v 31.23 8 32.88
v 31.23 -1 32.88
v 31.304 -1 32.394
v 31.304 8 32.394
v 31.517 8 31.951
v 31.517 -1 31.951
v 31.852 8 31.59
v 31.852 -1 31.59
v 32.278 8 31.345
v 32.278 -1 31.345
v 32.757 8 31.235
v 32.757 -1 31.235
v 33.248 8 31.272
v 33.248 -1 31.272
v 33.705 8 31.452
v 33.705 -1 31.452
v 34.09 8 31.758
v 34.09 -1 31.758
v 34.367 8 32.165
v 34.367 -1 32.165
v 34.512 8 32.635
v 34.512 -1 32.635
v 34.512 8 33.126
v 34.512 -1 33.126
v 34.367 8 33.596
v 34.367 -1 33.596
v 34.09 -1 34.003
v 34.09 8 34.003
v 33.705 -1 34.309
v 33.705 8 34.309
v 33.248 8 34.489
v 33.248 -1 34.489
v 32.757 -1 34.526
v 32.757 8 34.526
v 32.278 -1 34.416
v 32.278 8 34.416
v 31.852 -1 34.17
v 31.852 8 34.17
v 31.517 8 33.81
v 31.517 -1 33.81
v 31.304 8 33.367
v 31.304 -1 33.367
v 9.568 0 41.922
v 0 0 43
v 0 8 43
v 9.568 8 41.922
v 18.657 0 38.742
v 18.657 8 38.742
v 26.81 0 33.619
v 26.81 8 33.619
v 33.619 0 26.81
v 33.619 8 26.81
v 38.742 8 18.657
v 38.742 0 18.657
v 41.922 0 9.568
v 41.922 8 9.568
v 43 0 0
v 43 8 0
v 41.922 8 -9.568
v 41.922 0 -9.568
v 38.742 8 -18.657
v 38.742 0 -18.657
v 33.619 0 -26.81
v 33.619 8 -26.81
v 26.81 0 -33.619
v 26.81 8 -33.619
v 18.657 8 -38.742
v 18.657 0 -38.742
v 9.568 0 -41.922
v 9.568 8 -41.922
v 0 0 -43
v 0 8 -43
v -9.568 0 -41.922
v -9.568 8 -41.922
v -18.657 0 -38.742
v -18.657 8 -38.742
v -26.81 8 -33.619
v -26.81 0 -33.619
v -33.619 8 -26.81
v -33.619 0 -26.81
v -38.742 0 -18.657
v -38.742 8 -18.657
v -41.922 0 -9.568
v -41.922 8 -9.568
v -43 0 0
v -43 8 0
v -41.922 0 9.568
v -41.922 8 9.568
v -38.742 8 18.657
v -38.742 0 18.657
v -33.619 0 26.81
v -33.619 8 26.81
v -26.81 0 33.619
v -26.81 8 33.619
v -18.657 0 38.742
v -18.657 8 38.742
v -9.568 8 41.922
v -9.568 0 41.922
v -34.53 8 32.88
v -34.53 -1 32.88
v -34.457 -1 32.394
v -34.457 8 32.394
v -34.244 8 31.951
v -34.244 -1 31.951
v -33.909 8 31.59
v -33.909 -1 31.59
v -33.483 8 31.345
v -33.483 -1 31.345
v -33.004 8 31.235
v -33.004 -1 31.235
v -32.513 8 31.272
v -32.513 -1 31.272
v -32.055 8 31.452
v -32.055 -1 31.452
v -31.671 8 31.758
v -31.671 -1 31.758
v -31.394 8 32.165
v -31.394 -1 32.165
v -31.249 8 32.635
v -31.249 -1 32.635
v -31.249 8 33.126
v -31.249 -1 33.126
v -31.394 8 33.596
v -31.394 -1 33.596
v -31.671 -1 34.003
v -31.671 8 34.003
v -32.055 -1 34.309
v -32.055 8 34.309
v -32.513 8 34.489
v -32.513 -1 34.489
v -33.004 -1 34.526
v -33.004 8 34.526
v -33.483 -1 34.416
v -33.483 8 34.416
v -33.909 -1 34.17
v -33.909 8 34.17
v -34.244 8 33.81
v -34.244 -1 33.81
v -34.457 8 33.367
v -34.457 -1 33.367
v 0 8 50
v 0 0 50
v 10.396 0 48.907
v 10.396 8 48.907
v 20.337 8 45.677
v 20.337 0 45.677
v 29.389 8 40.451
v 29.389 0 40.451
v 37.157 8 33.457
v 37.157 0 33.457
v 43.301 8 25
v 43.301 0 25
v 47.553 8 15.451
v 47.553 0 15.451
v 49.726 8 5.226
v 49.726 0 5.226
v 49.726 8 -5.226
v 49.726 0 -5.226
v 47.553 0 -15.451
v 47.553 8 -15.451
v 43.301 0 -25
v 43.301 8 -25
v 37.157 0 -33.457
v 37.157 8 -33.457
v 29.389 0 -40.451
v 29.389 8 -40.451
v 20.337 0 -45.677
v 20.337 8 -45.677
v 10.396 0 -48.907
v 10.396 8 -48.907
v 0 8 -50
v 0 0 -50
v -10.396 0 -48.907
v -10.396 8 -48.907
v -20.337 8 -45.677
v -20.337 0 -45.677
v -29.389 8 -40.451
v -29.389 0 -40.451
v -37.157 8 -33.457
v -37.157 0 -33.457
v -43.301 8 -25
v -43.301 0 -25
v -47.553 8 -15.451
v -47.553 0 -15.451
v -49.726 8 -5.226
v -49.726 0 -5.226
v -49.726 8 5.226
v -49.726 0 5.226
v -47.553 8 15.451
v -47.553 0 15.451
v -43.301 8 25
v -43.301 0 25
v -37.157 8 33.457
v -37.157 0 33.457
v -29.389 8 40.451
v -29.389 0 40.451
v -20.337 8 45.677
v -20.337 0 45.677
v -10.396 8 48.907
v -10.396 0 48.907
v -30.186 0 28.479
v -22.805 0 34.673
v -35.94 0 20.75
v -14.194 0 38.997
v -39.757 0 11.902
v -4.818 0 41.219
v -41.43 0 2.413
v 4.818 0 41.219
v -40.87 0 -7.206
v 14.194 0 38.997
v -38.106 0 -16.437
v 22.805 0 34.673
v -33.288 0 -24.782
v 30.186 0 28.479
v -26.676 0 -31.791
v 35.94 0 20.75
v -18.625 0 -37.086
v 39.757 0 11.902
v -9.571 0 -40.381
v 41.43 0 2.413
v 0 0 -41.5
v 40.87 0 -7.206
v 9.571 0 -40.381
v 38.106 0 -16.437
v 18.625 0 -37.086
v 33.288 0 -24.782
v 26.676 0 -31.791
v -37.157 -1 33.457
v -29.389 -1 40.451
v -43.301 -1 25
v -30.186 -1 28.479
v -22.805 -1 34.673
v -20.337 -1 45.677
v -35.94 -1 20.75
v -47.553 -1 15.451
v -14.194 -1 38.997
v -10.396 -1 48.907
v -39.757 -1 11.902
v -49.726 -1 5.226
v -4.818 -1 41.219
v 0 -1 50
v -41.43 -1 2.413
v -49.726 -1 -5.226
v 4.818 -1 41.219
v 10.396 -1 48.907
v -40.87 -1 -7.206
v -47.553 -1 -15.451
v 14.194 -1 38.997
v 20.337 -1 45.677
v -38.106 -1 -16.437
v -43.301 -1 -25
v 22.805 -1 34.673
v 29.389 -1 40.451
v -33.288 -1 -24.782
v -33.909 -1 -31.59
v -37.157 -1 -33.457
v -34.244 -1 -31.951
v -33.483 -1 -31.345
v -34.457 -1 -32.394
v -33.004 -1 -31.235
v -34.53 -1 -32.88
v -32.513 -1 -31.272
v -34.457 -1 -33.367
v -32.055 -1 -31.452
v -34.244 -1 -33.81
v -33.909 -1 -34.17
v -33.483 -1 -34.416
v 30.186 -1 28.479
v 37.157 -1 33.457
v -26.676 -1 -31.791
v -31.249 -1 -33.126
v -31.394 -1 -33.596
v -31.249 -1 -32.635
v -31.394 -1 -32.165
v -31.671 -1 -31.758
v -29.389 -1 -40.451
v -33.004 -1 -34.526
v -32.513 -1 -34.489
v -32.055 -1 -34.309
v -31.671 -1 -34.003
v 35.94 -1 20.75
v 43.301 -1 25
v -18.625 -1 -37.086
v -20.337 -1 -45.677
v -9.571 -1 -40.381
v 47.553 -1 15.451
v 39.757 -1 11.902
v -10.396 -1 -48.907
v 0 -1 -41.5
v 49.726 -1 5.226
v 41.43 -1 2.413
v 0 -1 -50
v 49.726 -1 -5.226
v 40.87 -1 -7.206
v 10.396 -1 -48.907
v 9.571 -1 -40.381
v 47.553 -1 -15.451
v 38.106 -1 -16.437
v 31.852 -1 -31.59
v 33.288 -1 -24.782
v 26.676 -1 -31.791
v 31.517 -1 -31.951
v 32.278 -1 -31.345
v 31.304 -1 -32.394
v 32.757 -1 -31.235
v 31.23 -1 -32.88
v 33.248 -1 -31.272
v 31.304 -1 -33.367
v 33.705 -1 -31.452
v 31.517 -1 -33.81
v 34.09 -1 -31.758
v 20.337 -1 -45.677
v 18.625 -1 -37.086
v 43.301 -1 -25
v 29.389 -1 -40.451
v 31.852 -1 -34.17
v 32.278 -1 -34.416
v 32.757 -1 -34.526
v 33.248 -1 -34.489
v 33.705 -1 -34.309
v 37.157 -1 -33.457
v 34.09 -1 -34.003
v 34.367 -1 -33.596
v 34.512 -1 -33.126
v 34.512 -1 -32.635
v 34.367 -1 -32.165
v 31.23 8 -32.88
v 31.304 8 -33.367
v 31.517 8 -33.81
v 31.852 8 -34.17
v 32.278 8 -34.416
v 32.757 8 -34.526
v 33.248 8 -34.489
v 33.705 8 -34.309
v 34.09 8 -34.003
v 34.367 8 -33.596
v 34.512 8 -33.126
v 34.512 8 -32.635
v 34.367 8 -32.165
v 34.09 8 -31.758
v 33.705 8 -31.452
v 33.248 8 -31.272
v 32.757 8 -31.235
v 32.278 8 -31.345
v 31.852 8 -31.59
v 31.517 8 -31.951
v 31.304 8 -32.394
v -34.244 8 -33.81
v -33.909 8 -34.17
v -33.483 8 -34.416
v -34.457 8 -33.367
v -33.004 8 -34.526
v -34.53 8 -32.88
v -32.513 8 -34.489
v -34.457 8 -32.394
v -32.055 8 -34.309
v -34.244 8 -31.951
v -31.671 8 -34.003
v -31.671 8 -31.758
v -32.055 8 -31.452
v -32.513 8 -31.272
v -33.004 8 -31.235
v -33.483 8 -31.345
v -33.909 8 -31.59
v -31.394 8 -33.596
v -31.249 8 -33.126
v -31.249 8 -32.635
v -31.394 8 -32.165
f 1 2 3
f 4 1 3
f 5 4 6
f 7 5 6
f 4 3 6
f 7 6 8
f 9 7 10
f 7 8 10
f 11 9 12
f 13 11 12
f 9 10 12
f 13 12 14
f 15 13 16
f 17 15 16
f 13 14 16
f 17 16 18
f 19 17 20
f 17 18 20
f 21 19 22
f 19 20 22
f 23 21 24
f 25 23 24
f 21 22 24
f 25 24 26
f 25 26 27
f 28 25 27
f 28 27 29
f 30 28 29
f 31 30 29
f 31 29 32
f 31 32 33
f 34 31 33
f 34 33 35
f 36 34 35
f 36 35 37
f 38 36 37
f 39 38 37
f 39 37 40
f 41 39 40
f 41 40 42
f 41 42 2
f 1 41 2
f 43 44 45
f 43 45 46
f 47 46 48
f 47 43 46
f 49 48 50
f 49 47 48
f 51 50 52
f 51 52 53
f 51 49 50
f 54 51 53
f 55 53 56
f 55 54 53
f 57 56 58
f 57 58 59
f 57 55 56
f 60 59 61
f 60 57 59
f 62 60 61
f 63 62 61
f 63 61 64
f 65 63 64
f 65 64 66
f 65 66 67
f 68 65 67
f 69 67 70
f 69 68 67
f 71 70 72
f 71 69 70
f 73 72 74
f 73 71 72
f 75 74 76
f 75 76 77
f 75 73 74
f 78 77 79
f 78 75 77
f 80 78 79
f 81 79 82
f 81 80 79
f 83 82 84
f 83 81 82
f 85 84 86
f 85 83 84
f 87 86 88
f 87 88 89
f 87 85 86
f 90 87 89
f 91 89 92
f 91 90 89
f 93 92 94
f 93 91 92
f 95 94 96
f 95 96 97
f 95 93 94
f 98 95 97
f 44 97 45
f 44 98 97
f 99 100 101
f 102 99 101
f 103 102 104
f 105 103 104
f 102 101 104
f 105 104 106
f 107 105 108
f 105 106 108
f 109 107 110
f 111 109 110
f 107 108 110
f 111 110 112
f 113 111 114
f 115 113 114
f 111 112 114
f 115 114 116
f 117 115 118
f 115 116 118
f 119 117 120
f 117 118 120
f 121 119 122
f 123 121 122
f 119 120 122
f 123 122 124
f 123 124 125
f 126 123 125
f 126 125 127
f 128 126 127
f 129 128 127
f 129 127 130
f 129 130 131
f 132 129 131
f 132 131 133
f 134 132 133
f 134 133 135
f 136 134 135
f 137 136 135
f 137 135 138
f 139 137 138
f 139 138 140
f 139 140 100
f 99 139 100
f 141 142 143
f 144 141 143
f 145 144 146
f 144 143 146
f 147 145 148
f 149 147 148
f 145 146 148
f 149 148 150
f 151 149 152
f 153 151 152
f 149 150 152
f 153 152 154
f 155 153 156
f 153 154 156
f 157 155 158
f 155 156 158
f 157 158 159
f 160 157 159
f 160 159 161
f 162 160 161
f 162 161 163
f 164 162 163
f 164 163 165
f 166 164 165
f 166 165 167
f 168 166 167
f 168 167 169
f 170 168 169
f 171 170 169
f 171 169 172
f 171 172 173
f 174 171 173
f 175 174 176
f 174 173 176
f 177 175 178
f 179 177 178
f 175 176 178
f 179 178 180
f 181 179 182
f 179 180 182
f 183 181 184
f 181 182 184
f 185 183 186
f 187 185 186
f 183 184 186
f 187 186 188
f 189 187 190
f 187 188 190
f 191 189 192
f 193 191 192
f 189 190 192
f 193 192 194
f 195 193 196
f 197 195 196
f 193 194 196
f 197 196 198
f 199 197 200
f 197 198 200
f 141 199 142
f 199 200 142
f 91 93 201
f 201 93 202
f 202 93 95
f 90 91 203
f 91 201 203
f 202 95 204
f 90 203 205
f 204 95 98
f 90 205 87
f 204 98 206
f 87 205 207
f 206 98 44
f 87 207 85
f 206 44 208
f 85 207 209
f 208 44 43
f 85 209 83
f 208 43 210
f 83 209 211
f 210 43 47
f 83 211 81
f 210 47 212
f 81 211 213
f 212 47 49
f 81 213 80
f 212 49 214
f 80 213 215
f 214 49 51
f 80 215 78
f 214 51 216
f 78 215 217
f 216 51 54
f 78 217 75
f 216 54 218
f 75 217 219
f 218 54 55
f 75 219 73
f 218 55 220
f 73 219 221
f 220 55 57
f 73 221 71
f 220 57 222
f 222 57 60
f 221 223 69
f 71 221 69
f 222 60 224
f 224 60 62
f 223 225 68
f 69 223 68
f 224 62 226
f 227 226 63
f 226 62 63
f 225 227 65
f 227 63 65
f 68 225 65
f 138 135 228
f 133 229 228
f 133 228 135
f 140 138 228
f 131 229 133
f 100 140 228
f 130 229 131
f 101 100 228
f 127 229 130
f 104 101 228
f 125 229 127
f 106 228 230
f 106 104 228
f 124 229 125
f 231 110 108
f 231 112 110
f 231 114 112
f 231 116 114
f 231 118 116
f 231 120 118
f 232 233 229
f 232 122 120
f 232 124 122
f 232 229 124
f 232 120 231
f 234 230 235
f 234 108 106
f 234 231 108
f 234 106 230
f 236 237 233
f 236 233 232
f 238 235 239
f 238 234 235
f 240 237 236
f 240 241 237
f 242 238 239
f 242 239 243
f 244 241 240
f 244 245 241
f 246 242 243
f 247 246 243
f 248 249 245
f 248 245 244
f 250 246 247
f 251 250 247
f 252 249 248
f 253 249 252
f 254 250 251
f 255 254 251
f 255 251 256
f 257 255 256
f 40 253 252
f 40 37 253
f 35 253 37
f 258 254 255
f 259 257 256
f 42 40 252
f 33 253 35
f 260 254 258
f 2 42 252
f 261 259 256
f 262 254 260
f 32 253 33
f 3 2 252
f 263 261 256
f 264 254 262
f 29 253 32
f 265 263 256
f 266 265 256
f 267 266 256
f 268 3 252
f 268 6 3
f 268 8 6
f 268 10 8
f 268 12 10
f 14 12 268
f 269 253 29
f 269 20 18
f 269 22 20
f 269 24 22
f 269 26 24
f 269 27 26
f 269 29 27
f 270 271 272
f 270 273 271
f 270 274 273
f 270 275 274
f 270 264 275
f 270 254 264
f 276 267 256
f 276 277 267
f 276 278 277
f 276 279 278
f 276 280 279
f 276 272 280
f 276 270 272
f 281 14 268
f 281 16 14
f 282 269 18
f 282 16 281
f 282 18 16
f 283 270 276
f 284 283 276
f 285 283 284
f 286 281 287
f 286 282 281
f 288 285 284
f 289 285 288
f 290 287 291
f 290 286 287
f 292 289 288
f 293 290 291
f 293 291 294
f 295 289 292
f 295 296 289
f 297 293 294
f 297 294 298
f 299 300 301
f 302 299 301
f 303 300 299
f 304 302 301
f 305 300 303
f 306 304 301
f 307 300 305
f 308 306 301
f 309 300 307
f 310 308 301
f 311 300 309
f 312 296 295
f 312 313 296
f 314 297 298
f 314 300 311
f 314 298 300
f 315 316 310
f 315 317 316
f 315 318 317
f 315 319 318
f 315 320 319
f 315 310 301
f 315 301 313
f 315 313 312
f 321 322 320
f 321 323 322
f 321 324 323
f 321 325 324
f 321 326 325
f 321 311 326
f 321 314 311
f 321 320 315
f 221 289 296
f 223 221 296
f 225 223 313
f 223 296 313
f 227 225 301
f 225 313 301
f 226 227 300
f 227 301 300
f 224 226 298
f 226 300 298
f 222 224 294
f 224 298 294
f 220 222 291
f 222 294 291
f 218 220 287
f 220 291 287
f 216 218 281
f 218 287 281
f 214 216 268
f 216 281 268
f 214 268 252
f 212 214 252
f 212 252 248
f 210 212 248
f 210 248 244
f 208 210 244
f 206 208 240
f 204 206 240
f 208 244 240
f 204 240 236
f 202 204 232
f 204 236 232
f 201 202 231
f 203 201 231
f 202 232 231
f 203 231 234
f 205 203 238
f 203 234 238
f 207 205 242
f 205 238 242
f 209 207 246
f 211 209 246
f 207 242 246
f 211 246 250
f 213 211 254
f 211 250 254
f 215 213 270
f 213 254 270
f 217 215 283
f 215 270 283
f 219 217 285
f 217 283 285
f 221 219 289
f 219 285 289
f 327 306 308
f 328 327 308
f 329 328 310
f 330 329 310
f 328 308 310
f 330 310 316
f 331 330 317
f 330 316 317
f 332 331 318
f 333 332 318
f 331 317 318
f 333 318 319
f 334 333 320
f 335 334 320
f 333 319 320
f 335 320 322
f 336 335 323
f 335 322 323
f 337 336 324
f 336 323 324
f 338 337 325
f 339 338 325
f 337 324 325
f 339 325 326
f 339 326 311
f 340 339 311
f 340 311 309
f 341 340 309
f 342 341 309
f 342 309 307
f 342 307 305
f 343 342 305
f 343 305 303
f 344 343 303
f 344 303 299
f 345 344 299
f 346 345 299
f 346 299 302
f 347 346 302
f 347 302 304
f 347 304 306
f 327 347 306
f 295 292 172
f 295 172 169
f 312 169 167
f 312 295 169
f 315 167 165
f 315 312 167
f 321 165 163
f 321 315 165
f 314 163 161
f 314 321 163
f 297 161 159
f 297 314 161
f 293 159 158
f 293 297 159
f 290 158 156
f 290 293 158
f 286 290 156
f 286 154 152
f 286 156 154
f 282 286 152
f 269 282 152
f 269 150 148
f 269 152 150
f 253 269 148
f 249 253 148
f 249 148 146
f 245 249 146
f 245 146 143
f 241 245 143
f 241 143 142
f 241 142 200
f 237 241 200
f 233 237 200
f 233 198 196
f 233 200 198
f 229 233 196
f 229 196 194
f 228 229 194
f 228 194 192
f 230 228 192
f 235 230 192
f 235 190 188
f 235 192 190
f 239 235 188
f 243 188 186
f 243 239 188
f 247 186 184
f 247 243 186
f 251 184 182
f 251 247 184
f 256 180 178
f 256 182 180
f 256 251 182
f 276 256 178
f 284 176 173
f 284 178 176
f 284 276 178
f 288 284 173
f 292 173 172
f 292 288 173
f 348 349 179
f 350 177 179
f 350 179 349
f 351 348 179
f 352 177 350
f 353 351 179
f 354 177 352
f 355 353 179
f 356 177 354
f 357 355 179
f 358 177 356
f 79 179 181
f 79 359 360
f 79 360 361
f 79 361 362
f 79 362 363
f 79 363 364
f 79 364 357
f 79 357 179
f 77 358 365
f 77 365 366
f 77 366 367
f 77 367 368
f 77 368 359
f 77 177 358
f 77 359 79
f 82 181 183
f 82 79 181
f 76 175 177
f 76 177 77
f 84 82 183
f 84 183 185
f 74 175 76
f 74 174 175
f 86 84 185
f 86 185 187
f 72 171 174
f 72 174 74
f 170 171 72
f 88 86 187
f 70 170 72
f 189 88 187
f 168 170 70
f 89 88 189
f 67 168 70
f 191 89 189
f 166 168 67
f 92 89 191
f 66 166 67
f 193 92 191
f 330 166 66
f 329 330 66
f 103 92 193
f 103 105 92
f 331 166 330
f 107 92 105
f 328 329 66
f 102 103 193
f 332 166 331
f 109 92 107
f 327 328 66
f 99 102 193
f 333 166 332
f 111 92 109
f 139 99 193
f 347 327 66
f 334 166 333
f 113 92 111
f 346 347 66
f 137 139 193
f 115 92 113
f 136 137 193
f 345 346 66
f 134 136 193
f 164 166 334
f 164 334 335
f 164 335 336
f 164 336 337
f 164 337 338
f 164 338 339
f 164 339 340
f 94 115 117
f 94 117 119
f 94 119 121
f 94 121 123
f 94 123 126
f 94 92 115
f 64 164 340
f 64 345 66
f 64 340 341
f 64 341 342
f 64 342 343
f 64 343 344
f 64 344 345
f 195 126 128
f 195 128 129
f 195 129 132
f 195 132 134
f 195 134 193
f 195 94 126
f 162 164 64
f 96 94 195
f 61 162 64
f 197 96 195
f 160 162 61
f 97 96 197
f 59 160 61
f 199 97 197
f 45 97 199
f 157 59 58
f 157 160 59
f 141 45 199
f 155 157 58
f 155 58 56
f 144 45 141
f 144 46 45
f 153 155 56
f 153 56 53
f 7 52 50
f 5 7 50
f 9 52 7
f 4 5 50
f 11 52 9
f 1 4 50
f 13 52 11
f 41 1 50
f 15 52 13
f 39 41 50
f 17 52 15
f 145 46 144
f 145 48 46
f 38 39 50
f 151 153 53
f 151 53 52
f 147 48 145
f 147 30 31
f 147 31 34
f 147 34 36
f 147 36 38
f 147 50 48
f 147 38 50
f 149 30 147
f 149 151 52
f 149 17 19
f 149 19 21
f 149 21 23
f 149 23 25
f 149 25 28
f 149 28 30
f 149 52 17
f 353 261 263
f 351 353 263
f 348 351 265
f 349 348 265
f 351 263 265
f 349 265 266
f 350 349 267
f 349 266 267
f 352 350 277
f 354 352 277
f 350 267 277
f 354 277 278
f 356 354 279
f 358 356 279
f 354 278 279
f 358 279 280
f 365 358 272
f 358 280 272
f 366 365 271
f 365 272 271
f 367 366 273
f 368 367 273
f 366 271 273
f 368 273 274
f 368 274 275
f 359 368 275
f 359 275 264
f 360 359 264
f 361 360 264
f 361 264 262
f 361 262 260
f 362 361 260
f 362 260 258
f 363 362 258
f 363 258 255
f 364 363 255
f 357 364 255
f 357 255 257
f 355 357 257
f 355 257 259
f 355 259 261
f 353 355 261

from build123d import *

# Parameters (mm, degrees)
SKETCH_2_R         = 50
SKETCH_2_R_2       = 43
EXTRUDE_1_DEPTH    = 8
EXTRUDE_START      = 1
SKETCH_3_R         = 50
SKETCH_3_R_2       = 41.5
EXTRUDE_2_DEPTH    = 1
HOLE_WIZARD_M4_1_D = 3.3


with BuildPart() as part:
    # 草图2 → 凸台-拉伸1 (new body)
    with BuildSketch(Plane(origin=(0, 0, 0), x_dir=(1, 0, 0), z_dir=(0, 1, 0))):
        with Locations(Location((0, 0, 0), (0, 0, 270))):
            Circle(SKETCH_2_R)
        with Locations(Location((0, 0, 0), (0, 0, 270))):
            Circle(SKETCH_2_R_2, mode=Mode.SUBTRACT)
    extrude(amount=EXTRUDE_1_DEPTH)

    # 草图3 → 凸台-拉伸2 (add)
    with BuildSketch(Plane.XZ.offset(EXTRUDE_START)):
        with Locations(Location((0, 0, 0), (0, 0, 270))):
            Circle(SKETCH_3_R)
        with Locations(Location((0, 0, 0), (0, 0, 270))):
            Circle(SKETCH_3_R_2, mode=Mode.SUBTRACT)
    extrude(amount=-EXTRUDE_2_DEPTH)

    # M4 螺纹孔1 (through all)
    with Locations(Plane(origin=(0, 8, 0), x_dir=(1, 0, 0), z_dir=(0, 1, 0))):
        with Locations((-32.880465325, 32.880465325), (-32.880465325, -32.880465325), (32.880465325, -32.880465325), (32.880465325, 32.880465325)):
            Hole(HOLE_WIZARD_M4_1_D / 2)


solid = part.part
